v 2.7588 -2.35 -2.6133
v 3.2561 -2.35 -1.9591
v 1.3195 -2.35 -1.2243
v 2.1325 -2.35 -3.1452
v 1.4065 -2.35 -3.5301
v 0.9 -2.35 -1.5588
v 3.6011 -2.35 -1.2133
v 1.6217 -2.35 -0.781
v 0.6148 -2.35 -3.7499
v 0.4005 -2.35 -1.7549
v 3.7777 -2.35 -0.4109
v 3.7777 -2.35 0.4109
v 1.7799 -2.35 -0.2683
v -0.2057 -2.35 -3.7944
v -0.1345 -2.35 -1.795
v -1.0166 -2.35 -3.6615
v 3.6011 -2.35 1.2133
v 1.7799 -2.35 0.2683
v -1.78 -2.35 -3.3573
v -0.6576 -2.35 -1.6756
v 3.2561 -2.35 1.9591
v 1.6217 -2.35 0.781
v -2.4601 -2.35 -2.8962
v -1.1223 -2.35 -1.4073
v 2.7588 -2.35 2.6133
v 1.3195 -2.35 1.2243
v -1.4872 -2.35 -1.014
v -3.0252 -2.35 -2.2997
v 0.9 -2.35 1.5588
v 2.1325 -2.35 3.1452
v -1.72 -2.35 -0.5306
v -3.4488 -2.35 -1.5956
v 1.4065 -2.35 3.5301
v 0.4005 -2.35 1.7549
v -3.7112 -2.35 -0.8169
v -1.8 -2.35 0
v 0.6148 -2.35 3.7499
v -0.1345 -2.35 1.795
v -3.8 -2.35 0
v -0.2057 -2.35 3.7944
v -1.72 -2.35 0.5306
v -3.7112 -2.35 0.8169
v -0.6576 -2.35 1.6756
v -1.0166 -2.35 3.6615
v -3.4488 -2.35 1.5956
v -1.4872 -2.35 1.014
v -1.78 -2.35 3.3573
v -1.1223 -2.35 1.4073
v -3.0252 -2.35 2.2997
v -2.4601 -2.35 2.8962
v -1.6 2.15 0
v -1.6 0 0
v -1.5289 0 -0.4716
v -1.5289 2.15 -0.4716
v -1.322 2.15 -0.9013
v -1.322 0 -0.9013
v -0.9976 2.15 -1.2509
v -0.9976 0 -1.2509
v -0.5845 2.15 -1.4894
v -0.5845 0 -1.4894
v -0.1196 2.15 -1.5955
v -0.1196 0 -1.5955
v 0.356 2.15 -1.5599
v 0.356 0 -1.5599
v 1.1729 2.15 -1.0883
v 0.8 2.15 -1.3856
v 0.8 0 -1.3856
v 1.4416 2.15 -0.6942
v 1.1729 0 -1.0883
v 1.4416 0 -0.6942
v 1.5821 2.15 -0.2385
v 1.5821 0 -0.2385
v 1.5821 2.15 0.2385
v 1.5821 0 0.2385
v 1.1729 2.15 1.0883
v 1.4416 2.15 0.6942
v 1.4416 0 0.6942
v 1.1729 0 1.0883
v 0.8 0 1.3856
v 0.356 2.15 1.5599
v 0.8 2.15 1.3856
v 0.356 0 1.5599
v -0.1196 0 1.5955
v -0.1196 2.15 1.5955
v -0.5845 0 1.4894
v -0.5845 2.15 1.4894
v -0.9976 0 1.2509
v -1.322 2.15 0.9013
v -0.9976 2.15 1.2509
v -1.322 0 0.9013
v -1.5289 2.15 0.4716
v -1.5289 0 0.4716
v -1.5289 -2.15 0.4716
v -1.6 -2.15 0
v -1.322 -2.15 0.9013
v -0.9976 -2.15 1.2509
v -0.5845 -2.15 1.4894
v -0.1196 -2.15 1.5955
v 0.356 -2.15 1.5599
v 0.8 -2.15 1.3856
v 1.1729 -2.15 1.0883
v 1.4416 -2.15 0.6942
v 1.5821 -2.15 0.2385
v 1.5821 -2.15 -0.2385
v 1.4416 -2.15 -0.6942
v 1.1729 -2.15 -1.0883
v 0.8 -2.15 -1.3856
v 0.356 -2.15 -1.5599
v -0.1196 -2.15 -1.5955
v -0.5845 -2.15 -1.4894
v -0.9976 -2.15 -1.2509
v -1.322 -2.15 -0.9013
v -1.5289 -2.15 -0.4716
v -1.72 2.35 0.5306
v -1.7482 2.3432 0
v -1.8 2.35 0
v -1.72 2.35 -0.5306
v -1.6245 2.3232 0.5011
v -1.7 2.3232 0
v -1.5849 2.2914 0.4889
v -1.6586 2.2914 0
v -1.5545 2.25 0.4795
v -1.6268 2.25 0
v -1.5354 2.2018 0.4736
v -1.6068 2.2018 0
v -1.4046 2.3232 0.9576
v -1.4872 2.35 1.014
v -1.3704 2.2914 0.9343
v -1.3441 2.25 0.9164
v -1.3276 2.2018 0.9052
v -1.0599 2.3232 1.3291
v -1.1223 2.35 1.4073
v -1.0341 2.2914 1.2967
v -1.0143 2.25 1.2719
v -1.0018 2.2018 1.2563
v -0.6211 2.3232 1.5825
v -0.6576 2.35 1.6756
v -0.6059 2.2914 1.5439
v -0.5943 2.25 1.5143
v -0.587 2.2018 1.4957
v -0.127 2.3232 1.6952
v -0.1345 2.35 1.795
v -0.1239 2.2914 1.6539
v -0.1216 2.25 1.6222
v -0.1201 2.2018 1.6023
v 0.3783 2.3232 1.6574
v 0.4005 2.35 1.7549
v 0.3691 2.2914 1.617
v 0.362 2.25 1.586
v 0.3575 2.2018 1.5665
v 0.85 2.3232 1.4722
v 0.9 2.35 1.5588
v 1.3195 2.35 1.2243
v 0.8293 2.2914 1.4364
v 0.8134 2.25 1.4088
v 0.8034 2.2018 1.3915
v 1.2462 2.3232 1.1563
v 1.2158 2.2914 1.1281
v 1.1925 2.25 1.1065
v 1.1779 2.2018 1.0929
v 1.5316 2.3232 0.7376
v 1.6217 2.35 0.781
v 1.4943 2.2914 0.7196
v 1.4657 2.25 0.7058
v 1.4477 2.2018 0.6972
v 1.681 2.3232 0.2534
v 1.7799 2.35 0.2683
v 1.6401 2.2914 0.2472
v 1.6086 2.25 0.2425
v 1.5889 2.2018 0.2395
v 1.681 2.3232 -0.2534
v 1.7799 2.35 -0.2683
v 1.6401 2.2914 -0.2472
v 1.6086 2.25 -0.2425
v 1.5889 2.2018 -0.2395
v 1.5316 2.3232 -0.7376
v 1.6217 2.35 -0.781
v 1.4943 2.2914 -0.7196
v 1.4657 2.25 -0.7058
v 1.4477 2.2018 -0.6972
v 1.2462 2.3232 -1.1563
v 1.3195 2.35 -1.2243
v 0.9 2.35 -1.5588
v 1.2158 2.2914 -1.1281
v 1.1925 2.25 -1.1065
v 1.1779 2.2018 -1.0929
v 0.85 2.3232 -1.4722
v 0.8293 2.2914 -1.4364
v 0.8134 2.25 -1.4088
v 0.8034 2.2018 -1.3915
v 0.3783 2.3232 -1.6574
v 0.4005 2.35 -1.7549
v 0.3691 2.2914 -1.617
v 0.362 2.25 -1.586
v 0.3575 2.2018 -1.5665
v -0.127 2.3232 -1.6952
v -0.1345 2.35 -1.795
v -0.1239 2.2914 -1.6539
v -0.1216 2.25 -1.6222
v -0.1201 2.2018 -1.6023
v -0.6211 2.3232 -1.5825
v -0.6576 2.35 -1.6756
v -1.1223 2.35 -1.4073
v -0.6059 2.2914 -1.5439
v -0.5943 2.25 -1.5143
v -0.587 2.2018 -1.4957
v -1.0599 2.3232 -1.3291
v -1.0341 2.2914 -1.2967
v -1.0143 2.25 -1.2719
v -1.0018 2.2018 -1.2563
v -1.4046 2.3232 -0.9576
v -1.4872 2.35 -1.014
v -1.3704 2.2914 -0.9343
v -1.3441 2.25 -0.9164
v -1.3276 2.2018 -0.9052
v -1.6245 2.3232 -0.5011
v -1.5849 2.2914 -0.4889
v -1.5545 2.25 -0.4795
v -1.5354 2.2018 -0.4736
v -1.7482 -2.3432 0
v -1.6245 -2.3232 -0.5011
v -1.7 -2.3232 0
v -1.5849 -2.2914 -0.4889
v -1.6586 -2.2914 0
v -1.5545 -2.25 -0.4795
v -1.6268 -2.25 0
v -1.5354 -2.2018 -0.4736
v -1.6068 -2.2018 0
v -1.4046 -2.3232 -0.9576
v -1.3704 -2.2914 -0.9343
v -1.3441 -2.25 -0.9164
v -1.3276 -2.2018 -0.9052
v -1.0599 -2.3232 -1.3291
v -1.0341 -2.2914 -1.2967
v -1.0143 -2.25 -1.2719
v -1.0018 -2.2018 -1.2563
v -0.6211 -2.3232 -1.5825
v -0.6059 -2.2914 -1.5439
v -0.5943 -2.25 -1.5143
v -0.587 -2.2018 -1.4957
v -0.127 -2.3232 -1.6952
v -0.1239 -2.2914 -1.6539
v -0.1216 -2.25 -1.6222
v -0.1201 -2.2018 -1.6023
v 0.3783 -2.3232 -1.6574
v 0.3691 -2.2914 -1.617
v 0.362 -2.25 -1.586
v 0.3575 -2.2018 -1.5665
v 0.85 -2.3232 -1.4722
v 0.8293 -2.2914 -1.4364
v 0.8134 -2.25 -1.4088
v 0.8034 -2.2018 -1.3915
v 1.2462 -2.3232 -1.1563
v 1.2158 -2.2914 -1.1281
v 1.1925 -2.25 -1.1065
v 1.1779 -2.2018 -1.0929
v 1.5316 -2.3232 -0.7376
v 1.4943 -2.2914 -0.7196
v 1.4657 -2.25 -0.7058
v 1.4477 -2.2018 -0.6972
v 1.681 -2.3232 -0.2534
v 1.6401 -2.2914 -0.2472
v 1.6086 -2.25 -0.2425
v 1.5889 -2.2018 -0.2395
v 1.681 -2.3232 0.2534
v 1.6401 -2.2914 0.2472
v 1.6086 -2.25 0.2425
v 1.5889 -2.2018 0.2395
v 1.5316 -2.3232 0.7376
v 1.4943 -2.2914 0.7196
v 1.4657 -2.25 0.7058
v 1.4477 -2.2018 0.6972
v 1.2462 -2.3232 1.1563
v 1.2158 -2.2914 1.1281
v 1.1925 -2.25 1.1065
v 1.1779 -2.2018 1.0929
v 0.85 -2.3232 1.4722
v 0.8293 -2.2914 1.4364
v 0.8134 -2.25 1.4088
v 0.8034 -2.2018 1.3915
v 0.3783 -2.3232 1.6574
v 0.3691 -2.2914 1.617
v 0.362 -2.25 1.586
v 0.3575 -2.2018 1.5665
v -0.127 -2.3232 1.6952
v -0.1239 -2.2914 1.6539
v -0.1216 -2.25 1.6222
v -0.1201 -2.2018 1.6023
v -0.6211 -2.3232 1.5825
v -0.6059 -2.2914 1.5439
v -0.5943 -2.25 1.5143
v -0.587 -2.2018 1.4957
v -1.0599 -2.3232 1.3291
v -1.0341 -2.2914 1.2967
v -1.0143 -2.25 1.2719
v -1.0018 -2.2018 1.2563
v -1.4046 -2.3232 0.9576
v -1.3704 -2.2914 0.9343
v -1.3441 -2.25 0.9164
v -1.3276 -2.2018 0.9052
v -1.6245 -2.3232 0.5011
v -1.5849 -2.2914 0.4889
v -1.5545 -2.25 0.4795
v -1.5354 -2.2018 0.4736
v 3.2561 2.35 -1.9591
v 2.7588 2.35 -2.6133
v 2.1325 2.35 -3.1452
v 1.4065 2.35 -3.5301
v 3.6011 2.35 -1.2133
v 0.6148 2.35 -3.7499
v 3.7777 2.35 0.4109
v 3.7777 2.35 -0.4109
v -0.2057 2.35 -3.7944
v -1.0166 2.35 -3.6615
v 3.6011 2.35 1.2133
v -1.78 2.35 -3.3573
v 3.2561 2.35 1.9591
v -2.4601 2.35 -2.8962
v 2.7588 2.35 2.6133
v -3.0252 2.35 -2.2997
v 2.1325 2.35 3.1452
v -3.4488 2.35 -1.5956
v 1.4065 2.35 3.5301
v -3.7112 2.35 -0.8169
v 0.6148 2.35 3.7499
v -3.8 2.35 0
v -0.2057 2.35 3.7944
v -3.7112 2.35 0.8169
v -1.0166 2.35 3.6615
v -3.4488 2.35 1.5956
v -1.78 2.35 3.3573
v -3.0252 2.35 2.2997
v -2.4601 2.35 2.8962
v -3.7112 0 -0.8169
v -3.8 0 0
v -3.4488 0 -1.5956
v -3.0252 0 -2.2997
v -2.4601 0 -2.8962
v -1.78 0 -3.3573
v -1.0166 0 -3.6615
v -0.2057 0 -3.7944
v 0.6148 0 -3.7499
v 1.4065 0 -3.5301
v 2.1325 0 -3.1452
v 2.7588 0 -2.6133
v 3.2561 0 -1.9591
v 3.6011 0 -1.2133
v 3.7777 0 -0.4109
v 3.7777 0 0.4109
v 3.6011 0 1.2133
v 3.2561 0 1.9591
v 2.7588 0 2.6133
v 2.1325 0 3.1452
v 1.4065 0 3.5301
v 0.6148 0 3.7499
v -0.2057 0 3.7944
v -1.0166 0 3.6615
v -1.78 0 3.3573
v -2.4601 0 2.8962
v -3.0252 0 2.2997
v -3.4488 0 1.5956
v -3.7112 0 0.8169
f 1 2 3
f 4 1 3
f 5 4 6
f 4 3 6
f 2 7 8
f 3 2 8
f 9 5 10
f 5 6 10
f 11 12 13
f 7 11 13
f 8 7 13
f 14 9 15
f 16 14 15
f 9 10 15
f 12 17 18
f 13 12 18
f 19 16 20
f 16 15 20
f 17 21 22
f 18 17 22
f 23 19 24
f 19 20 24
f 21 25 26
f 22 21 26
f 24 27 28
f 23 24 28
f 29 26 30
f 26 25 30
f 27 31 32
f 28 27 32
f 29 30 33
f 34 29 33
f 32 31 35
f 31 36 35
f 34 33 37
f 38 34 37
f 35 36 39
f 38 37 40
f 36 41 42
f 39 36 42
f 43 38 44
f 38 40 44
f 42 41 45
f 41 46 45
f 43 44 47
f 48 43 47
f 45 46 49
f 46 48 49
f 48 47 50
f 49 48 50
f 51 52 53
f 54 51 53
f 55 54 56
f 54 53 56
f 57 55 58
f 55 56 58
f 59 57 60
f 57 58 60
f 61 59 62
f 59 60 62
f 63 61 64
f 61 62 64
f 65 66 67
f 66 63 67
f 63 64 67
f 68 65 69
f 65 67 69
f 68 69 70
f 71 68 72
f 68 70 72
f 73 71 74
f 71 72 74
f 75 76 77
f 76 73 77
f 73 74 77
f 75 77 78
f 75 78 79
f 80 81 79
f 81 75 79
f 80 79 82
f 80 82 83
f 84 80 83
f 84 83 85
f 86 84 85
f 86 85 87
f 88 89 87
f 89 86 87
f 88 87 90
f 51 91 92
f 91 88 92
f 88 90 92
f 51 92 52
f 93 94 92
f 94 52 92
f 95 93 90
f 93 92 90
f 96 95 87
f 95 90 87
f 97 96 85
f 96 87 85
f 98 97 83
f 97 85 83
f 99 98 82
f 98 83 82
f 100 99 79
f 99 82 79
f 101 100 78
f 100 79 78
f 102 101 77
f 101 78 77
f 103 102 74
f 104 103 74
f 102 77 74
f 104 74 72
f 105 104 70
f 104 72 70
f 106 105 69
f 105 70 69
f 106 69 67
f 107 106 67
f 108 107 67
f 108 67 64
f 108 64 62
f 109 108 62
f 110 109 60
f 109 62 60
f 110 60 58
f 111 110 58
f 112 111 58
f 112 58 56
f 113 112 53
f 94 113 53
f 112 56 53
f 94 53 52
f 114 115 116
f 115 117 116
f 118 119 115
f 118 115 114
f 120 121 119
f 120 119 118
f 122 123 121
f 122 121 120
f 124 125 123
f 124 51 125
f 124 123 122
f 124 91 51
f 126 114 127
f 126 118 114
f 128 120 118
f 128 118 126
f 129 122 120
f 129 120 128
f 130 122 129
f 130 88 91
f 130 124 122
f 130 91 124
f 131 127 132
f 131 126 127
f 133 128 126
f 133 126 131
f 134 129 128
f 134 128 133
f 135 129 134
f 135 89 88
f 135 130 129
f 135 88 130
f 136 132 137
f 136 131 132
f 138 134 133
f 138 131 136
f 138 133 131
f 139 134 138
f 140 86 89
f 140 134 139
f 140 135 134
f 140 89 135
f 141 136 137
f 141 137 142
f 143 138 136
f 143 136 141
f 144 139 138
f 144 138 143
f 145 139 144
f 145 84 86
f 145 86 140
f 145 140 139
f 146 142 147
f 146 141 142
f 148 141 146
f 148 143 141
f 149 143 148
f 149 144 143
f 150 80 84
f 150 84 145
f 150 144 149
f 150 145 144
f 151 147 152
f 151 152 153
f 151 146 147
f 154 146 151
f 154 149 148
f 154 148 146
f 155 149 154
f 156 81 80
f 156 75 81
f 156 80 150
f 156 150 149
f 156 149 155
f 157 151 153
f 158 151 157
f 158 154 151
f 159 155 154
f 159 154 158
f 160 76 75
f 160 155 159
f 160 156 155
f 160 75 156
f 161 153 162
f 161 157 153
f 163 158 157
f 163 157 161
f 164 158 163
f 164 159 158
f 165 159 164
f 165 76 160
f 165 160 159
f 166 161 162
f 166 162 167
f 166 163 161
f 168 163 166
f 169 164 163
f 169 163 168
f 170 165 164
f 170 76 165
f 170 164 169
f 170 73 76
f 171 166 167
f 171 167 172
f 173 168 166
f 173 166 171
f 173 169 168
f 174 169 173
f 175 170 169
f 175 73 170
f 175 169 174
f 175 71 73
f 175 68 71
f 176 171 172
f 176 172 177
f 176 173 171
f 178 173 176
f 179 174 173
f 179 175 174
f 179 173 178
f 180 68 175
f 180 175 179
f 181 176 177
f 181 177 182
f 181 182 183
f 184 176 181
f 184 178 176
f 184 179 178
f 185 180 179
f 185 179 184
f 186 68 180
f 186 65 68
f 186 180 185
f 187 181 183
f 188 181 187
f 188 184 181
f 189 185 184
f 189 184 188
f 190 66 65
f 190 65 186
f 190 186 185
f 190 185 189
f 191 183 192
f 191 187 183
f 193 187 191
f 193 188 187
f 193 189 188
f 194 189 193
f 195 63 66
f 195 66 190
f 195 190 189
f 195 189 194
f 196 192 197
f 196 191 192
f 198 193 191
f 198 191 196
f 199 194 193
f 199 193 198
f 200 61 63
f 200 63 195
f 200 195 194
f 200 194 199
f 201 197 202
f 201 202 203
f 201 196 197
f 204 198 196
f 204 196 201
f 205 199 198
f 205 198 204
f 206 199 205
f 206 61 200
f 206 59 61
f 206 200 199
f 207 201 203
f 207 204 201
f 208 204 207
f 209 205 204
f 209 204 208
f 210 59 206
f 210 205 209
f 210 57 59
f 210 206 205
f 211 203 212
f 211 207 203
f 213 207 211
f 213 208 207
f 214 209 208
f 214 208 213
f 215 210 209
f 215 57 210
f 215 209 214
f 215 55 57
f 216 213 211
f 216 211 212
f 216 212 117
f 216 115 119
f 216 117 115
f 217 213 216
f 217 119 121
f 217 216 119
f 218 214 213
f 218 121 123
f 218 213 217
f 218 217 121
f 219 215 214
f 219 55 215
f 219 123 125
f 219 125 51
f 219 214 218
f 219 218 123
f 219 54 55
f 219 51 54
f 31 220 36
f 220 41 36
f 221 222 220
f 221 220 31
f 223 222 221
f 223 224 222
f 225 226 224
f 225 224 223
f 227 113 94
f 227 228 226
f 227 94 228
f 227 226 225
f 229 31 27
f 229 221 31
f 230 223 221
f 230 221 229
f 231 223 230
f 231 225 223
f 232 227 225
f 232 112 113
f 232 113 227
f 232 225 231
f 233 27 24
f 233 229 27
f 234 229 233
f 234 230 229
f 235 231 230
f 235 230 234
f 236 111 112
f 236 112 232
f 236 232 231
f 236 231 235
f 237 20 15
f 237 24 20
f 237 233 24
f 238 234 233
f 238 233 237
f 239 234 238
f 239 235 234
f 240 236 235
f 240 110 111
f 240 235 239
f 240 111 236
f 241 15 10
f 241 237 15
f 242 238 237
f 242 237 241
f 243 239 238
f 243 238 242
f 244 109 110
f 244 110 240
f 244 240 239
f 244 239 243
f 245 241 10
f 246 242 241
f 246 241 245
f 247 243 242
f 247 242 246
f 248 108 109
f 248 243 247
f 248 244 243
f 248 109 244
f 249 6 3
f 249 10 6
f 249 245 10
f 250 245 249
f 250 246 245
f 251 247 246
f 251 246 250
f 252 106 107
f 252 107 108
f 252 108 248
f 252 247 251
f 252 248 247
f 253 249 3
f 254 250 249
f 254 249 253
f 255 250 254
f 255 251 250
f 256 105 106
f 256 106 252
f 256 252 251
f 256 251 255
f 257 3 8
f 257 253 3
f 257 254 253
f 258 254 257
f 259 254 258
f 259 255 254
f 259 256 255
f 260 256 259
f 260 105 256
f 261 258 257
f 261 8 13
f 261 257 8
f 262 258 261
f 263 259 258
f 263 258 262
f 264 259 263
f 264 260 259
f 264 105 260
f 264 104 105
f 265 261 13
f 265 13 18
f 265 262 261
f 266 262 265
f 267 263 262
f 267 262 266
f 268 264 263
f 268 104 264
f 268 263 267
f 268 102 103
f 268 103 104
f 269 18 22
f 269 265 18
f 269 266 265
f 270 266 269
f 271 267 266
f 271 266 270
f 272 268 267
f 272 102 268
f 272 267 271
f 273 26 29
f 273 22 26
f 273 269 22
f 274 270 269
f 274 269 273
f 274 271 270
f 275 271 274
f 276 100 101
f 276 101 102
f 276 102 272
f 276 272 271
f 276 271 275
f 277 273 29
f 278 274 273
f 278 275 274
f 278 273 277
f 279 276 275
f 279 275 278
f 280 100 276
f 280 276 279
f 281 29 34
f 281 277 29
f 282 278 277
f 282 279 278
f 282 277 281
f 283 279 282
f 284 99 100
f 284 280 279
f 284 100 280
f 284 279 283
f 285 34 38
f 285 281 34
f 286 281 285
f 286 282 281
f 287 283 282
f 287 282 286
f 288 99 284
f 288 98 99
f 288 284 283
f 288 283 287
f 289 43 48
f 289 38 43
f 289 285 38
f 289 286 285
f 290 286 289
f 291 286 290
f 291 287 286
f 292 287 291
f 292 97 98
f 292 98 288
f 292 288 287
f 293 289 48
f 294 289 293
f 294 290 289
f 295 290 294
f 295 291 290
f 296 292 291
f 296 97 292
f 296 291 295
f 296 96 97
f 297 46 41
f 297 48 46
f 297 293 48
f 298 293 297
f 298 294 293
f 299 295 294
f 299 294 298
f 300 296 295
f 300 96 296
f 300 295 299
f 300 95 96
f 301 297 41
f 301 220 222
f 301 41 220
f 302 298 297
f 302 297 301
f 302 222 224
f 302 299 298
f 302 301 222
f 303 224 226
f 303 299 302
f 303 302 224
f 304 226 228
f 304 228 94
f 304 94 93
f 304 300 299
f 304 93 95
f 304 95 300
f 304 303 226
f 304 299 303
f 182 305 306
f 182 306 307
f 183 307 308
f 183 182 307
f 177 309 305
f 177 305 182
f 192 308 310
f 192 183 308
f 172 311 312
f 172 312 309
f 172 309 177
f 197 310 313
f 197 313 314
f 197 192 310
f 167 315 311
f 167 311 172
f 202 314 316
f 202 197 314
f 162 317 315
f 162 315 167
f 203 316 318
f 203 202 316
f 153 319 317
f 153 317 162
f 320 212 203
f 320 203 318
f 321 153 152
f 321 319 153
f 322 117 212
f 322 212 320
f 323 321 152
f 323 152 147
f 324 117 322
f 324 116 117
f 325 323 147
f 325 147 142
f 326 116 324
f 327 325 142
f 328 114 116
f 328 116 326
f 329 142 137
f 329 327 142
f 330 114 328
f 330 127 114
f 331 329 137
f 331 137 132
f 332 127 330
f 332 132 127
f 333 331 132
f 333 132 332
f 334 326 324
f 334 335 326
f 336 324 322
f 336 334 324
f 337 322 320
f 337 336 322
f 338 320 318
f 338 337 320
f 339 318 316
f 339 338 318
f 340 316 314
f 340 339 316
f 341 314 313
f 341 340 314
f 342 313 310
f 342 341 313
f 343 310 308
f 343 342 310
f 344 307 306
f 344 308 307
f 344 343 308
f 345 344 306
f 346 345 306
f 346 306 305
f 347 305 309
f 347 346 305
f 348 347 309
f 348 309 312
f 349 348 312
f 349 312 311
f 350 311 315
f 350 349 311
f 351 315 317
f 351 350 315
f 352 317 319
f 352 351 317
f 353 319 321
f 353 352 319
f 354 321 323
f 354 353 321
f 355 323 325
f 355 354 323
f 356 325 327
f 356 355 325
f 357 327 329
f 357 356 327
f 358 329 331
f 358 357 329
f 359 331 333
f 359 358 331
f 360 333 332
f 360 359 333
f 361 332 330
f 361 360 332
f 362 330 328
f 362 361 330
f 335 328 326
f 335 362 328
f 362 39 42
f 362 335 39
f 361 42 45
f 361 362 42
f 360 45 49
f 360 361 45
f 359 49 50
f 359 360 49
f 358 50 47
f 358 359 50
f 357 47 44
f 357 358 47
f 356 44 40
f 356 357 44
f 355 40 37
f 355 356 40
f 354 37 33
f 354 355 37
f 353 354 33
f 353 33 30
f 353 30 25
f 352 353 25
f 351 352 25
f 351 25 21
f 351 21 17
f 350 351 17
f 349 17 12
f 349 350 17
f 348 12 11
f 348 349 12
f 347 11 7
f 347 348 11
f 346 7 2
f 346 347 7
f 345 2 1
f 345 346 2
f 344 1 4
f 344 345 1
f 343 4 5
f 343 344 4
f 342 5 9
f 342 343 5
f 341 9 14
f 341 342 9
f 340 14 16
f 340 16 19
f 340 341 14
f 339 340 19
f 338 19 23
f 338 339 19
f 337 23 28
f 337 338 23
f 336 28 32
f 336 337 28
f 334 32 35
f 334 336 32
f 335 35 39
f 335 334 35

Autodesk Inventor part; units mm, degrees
ref_plane "YZ Plane" through (0, 0, 0) normal (1, 0, 0) x (0, 1, 0)
ref_plane "XZ Plane" through (0, 0, 0) normal (0, 1, 0) x (-1, 0, 0)
ref_plane "XY Plane" through (0, 0, 0) normal (0, 0, 1) x (1, 0, 0)
sketch "Sketch1" plane through (0, 0, 0) normal (0, 1, 0) x (-1, 0, 0)
  circle A0 centre (0, 0) radius 1.6
  circle A1 centre (0, 0) radius 3.8
  dimension "d0" = 3.2
  dimension "d1" = 2.2
extrude "Extrusion1" add sketch "Sketch1" along normal mid plane 4.7
fillet "Fillet1" radius 0.2 2 edges at (1.6, 2.35, 0) (1.6, -2.35, 0)
properties part number "Soportes tarjeta conectora CAEN"
